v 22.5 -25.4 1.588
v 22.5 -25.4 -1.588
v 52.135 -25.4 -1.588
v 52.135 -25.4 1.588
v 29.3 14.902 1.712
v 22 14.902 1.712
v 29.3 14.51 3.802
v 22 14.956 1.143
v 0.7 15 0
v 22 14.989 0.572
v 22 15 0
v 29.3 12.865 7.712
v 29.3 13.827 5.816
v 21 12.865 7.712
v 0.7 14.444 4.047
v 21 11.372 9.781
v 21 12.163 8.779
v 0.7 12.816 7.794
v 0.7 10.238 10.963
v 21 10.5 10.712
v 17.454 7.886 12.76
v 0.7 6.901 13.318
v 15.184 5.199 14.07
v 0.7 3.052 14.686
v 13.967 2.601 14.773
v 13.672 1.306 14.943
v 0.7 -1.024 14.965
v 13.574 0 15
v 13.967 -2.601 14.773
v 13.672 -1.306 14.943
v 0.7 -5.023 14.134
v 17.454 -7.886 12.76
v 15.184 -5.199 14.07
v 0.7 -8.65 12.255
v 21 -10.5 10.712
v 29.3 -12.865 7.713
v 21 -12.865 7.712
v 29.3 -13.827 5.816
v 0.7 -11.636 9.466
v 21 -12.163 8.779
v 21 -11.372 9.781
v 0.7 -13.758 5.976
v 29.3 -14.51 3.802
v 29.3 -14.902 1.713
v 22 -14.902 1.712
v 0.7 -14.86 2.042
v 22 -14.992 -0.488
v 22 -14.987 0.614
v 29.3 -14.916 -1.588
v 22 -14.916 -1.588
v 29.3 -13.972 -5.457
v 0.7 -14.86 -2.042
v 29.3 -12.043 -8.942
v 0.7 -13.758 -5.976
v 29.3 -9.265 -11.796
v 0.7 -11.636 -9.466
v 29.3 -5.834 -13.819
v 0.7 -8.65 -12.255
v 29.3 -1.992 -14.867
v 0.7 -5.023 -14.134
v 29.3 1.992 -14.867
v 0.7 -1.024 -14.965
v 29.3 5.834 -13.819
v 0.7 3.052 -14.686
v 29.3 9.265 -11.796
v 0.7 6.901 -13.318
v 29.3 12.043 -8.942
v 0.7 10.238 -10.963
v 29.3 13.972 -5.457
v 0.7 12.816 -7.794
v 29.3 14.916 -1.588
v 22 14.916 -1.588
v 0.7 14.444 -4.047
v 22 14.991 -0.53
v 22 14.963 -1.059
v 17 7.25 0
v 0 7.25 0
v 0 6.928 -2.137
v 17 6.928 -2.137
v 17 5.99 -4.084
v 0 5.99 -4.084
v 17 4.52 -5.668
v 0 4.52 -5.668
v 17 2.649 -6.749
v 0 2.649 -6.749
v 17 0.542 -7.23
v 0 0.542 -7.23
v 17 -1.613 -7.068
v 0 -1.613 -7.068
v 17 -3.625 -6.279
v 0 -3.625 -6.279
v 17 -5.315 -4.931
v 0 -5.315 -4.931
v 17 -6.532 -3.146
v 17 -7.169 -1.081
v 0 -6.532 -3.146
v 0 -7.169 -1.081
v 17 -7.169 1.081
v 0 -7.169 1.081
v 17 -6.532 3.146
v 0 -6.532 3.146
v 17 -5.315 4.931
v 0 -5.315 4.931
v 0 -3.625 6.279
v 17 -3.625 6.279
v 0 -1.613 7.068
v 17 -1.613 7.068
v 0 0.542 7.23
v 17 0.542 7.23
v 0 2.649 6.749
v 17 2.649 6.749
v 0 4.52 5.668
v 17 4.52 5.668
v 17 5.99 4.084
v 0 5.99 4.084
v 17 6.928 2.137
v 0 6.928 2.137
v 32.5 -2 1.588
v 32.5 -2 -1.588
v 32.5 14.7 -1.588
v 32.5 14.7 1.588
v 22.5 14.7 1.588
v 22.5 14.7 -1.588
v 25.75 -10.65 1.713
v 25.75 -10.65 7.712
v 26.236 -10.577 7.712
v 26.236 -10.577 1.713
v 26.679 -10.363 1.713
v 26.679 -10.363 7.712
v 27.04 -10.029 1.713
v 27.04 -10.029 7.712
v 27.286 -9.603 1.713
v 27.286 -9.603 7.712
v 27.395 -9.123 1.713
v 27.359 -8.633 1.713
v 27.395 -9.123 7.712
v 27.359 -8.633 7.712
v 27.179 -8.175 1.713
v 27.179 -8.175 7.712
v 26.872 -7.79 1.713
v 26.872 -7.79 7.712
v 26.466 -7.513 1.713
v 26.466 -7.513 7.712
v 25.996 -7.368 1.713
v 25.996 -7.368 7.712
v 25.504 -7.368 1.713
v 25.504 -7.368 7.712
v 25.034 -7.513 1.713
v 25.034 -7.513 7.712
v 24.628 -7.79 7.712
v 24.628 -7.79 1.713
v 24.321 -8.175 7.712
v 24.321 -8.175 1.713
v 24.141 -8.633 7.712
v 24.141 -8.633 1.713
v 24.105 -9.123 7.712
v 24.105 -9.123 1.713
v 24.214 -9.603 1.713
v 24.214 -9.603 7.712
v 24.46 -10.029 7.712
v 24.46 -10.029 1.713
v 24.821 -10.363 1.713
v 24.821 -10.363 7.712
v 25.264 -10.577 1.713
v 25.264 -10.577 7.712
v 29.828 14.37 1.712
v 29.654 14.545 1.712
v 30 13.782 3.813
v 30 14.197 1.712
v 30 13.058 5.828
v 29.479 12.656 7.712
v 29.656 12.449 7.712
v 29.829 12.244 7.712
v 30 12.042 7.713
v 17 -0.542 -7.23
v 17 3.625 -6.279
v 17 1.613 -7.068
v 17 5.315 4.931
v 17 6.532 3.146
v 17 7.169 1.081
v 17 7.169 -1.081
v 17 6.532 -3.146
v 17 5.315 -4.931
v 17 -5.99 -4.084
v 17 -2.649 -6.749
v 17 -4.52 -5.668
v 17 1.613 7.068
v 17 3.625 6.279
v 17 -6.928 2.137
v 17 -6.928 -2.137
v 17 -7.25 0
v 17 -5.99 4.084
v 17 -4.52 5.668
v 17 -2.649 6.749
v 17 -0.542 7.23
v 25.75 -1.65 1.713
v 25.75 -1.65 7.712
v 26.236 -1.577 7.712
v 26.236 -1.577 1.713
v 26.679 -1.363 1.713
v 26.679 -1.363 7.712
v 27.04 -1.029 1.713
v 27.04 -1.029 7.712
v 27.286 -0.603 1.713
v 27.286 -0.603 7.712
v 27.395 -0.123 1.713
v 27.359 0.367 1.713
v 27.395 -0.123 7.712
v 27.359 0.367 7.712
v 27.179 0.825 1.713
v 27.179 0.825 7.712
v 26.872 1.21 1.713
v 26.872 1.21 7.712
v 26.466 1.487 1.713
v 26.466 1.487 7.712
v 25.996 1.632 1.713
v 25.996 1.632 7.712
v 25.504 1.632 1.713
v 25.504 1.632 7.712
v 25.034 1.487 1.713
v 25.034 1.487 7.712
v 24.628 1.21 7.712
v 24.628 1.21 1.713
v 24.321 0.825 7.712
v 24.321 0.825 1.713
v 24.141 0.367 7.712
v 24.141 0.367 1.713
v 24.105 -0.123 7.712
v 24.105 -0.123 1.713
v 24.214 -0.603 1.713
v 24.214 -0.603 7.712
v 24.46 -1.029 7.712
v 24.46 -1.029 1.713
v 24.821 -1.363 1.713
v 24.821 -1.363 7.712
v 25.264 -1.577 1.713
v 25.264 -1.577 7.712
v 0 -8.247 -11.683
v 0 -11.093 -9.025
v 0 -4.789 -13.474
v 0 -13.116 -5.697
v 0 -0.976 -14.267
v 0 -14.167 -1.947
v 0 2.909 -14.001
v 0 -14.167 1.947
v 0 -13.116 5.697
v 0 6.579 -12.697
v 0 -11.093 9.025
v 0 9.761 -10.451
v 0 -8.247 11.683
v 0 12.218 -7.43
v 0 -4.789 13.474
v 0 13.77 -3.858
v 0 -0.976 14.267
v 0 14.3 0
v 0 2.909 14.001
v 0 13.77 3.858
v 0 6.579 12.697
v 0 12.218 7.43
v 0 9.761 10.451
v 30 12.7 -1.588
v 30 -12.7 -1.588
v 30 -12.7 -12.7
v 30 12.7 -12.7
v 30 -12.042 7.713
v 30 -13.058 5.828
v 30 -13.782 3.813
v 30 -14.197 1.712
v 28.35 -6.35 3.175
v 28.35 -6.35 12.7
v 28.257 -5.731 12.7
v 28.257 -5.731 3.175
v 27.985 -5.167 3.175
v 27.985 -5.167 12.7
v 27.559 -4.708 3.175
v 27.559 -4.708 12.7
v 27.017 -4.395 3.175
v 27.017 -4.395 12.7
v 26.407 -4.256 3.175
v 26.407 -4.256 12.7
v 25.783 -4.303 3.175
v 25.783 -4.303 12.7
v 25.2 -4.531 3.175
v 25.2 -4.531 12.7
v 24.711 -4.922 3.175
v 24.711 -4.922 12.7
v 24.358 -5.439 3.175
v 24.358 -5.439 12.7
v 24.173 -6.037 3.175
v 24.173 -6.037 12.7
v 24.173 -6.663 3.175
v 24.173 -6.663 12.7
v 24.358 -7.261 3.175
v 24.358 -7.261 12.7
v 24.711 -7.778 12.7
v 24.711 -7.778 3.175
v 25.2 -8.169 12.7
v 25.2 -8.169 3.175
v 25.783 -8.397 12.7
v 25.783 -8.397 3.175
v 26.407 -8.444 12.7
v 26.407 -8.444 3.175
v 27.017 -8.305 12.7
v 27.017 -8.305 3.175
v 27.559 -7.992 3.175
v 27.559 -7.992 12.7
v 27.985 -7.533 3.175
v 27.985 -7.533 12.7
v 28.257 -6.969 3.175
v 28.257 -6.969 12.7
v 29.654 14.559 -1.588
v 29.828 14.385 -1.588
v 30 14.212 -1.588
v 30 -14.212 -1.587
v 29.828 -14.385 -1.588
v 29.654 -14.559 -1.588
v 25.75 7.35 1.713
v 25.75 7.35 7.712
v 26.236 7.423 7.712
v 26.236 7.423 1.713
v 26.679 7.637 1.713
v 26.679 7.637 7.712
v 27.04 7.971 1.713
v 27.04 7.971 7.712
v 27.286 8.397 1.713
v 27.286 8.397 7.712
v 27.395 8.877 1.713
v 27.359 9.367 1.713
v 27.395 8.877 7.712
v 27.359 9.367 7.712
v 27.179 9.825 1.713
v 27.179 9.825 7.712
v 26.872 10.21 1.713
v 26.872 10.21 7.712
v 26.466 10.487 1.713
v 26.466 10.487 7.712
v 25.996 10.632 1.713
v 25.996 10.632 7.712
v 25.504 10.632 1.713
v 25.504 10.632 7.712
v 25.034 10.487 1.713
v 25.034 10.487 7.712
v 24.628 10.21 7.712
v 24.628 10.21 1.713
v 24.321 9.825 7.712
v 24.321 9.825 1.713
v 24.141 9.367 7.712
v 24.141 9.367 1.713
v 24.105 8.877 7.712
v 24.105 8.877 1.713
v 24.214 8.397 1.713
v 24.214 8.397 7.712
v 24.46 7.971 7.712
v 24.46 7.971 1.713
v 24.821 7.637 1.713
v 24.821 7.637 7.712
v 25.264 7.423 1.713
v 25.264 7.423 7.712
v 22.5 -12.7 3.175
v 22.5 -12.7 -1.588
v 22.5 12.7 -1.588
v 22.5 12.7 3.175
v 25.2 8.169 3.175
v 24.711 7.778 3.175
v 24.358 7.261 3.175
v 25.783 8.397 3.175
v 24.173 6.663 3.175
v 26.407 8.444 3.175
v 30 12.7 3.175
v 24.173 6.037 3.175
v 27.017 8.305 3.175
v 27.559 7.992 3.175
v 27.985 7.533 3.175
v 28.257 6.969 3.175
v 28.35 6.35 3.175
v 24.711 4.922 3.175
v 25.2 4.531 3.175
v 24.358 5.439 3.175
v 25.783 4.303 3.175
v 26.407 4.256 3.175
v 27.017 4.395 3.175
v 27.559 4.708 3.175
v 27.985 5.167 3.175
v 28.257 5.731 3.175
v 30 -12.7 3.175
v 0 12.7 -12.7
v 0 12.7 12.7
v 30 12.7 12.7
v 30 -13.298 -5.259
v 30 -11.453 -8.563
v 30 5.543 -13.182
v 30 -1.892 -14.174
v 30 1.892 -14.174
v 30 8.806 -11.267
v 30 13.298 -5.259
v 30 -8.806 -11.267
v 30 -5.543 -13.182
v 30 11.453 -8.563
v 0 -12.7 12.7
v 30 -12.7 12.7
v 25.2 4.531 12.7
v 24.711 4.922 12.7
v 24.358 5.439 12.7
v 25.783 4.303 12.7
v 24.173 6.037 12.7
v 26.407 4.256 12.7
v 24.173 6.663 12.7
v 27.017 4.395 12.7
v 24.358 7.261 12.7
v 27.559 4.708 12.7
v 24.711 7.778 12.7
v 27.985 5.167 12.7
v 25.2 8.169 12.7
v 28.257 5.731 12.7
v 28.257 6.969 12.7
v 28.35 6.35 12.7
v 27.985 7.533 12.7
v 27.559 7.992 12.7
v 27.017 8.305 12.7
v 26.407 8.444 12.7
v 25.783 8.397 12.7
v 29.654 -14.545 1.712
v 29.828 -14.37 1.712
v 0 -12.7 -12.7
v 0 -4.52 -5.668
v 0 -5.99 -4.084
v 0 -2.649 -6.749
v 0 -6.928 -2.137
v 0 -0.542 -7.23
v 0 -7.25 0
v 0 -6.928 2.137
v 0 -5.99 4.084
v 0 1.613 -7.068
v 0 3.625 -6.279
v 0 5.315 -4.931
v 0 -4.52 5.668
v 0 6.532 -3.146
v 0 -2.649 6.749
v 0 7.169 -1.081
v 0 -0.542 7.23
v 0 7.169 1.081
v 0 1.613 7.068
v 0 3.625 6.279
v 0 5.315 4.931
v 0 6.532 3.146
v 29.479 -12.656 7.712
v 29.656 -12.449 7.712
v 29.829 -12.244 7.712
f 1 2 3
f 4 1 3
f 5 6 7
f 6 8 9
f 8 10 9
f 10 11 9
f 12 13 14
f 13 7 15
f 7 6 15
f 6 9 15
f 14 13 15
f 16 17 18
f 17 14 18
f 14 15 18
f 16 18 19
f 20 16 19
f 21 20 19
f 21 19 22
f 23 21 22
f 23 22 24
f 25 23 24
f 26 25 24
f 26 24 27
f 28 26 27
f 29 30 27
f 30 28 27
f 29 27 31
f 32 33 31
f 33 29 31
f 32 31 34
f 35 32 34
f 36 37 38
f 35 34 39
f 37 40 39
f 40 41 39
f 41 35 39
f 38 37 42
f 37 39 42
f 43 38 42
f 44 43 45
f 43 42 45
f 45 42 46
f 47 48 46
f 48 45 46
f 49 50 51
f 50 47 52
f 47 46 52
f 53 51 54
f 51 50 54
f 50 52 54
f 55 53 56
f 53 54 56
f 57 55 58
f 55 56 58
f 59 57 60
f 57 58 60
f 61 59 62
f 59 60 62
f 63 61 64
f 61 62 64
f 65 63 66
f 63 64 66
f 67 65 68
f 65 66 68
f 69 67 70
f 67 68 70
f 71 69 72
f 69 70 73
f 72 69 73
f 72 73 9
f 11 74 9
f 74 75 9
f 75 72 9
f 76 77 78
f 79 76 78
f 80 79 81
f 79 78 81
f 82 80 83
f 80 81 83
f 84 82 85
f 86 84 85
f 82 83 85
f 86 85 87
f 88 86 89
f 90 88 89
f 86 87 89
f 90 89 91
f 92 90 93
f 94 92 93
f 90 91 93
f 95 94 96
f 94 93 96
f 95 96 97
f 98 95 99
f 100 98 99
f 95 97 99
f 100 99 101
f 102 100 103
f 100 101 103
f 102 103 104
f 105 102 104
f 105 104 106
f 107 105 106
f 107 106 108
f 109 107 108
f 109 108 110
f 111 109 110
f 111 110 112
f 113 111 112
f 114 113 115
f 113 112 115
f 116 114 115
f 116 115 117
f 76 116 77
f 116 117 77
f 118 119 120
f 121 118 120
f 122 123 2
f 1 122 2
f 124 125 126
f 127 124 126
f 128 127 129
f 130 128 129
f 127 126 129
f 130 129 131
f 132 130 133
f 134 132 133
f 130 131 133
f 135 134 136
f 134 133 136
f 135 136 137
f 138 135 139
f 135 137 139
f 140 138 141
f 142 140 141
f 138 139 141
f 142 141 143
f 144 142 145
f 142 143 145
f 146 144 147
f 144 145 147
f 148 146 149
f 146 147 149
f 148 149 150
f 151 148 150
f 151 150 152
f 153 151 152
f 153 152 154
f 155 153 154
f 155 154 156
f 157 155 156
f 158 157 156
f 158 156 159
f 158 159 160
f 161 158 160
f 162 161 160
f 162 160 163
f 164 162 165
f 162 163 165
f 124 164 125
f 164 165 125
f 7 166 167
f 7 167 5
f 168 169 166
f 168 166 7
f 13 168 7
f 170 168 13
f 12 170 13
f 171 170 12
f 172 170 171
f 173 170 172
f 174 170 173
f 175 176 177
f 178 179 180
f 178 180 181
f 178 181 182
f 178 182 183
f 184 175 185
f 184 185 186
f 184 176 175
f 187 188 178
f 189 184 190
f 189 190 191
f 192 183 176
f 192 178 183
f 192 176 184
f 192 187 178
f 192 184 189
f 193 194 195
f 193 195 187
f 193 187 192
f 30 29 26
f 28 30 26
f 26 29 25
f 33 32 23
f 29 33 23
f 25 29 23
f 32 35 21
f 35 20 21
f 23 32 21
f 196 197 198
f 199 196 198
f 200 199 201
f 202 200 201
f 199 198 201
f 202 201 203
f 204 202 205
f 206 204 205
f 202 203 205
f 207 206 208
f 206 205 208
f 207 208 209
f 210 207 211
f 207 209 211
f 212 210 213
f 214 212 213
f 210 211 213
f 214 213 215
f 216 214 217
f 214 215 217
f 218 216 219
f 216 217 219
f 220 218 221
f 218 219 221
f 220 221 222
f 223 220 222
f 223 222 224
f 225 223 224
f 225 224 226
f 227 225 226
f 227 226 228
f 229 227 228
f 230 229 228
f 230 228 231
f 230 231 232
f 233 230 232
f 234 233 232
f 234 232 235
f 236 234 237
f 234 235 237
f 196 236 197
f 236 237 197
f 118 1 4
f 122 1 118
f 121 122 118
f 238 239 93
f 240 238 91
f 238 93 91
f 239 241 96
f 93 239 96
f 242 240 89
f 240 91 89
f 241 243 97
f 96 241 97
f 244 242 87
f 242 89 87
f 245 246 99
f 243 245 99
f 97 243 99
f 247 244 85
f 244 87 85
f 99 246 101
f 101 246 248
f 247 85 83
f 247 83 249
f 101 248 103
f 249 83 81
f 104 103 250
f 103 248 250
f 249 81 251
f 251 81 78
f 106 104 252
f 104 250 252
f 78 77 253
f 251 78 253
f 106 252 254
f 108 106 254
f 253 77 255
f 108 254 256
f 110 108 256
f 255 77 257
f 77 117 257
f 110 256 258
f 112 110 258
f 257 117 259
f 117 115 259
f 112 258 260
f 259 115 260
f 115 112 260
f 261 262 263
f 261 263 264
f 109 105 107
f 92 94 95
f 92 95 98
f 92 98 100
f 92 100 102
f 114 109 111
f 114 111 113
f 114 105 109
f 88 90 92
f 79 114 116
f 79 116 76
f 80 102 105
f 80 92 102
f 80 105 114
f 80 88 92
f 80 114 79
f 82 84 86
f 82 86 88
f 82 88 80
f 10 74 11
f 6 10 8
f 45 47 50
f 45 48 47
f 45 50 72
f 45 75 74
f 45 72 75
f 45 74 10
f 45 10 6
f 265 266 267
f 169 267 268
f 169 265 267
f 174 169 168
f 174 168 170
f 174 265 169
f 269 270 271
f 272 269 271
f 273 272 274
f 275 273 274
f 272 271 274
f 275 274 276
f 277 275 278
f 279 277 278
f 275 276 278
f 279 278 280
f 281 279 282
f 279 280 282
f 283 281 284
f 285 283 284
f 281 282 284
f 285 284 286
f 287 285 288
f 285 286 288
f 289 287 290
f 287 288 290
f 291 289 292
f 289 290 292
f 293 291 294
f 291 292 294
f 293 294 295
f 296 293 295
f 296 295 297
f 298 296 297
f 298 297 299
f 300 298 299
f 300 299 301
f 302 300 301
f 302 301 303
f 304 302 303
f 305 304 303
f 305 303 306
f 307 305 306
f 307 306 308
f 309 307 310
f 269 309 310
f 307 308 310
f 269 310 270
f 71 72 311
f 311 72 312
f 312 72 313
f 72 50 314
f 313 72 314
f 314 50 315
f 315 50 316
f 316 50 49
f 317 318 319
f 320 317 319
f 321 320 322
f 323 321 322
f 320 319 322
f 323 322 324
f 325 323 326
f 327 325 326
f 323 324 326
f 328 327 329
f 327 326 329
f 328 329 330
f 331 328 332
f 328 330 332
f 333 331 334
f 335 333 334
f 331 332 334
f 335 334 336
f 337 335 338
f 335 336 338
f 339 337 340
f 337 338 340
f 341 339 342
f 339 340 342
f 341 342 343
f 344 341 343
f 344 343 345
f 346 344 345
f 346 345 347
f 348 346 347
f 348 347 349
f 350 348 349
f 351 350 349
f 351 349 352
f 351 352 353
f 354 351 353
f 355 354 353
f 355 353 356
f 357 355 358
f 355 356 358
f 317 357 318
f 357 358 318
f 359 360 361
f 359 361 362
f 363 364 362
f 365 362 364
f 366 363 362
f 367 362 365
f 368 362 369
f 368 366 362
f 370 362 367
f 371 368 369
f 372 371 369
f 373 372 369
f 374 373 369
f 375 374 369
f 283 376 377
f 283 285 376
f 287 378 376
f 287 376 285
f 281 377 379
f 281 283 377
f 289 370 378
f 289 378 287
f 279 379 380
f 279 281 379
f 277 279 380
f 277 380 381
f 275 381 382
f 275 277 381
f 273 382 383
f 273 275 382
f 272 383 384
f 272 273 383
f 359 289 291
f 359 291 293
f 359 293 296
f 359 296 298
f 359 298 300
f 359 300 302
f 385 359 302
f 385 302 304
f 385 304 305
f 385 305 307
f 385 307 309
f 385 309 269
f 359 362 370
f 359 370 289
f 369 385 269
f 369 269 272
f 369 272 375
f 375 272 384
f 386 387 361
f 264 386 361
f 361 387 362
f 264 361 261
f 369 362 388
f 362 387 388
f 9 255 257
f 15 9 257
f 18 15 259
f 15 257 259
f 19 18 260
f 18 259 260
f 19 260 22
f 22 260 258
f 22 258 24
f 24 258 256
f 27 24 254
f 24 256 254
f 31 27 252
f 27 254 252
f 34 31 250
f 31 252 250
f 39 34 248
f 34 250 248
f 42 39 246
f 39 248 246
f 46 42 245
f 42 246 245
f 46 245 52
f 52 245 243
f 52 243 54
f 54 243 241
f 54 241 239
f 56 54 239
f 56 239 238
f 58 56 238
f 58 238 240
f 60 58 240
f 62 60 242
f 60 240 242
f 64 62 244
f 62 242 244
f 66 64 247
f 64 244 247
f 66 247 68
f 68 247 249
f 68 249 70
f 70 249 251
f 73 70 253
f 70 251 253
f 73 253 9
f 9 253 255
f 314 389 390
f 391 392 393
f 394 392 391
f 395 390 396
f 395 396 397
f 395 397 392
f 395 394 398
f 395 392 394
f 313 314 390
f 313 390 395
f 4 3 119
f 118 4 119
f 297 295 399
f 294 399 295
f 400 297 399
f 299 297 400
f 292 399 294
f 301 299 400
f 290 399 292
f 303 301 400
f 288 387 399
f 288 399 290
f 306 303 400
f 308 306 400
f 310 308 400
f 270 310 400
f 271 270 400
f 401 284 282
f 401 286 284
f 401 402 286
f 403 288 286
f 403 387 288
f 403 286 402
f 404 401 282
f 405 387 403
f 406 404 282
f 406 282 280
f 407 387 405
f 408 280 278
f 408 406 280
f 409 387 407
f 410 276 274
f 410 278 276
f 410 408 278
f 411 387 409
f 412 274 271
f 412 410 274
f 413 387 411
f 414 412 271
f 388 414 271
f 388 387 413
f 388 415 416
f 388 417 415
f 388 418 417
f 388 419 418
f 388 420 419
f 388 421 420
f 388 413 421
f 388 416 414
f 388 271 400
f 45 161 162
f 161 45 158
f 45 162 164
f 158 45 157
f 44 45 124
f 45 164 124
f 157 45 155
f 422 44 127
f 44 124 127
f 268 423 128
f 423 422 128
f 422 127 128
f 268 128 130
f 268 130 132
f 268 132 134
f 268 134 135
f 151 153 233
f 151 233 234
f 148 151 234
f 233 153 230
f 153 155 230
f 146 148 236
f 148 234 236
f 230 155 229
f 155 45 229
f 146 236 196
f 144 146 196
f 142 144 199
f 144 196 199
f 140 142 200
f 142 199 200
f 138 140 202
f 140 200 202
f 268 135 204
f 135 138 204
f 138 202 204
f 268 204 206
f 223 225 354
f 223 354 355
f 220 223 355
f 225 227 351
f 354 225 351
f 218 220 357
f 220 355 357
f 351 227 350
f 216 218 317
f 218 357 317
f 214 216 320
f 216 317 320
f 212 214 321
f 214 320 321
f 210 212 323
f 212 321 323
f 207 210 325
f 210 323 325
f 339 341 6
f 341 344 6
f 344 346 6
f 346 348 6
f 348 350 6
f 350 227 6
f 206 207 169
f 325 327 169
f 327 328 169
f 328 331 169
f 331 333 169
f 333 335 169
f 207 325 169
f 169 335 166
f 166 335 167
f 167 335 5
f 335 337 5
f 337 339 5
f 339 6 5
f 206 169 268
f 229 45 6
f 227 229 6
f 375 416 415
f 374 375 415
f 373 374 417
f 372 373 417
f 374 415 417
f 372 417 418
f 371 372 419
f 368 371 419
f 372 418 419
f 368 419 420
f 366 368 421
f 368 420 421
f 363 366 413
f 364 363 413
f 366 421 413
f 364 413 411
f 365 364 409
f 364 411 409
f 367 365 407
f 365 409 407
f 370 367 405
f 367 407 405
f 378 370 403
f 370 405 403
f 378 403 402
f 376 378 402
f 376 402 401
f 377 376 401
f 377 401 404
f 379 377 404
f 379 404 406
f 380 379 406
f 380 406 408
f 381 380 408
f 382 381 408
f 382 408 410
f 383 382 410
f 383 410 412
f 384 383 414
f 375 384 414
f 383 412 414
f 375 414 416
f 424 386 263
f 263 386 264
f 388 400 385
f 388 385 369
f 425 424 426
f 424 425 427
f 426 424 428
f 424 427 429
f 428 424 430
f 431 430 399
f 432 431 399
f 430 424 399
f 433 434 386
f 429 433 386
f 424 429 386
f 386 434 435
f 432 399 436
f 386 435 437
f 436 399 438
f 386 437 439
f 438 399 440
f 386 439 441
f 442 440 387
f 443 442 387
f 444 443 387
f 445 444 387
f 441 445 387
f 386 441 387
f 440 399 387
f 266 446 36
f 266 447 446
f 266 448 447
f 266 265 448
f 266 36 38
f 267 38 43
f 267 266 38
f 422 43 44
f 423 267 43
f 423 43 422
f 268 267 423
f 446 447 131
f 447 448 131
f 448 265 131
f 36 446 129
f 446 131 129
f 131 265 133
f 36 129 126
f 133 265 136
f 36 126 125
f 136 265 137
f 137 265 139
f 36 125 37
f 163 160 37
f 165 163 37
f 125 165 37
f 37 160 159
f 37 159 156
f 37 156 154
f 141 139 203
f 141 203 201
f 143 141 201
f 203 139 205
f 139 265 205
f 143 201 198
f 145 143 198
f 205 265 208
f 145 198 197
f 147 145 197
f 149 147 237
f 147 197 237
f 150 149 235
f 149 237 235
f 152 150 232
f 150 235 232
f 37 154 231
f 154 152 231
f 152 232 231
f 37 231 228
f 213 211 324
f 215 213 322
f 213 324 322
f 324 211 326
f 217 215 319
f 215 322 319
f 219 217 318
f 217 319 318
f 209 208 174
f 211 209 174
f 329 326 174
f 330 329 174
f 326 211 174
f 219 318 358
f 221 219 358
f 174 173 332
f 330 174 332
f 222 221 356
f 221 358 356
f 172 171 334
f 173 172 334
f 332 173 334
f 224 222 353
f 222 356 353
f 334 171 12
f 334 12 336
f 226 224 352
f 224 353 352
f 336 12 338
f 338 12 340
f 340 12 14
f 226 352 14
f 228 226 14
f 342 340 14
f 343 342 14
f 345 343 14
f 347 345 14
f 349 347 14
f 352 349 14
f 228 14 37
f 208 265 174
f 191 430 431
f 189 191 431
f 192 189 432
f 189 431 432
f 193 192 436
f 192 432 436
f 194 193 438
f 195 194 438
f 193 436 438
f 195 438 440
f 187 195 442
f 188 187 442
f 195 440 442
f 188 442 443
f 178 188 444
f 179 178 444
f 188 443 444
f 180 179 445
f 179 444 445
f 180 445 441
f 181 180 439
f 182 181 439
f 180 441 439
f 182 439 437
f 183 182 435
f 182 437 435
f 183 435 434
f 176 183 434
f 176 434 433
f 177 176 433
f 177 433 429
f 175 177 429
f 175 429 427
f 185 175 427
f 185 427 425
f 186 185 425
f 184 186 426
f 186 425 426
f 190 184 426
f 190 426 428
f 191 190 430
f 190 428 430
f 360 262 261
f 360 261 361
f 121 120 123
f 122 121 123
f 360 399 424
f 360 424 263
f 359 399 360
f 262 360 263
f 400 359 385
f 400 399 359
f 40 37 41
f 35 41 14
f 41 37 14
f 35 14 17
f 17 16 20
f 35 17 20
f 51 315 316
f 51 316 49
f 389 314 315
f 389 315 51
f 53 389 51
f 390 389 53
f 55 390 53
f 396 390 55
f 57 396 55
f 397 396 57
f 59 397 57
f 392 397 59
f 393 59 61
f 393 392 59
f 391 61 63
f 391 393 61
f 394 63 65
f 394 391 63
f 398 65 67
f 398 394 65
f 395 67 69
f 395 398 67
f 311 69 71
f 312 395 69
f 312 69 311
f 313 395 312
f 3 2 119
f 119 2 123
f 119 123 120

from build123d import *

# Parameters (mm, degrees)
SKETCH001_R       = 15
PAD_DEPTH         = 30
CHAMFER_SIZE      = 0.7
POCKET_DEPTH      = 15.001
POCKET_DEPTH_BACK = -15.001
SKETCH003_R       = 1.65
POCKET001_DEPTH   = 6
SKETCH004_R       = 7.25
POCKET002_DEPTH   = 17
PAD001_DEPTH      = 3.175
SKETCH006_W       = 30
SKETCH006_H       = 25.4
PAD002_DEPTH      = 12.7
SKETCH007_R       = 7.25
POCKET003_DEPTH   = 17
POCKET004_DEPTH   = 25.401
SKETCH010_R       = 2.1
POCKET005_DEPTH   = 9.525


with BuildPart() as body:
    # Sketch001 → Pad (new body)
    with BuildSketch(Plane.YZ):
        Circle(SKETCH001_R)
    extrude(amount=PAD_DEPTH)

    # Chamfer
    chamfer_edges = [body.edges().sort_by_distance(p)[0] for p in [
        (30, -15, 0),
        (0, -15, 0),
    ]]
    chamfer(chamfer_edges, length=CHAMFER_SIZE)

    # Sketch002 (on DatumPlane) → Pocket (cut, two sides)
    with BuildSketch(Plane(origin=(15, 0, 0), x_dir=(1, 0, 0), z_dir=(0, -1, 0))) as pocket_sk:
        Polygon((15, -1.5875), (7, -1.5875), (7, 1.7125), (15, 1.7125), (15, 7.7125), (6, 7.7125), (6, 10.7125), (-4.998523, 17.0625), (-4.998523, 38.7125), (16, 38.7125), (16, -1.5875), align=None)
    extrude(amount=-POCKET_DEPTH, mode=Mode.SUBTRACT)
    extrude(pocket_sk.sketch, amount=-POCKET_DEPTH_BACK, mode=Mode.SUBTRACT)

    # Sketch003 (on Face8 of Pocket) → Pocket001 (cut)
    with BuildSketch(Plane(origin=(0, 0, 7.7125), x_dir=(0, -1, 0), z_dir=(0, 0, 1))):
        with Locations((9, 25.75)):
            Circle(SKETCH003_R)
        with Locations((0, 25.75)):
            Circle(SKETCH003_R)
        with Locations((-9, 25.75)):
            Circle(SKETCH003_R)
    extrude(amount=-POCKET001_DEPTH, mode=Mode.SUBTRACT)

    # Sketch004 (on Face17 of Pocket001) → Pocket002 (cut)
    with BuildSketch(Plane(origin=(0, 0, 0), x_dir=(0, 1, 0), z_dir=(-1, 0, 0))):
        Circle(SKETCH004_R)
    extrude(amount=-POCKET002_DEPTH, mode=Mode.SUBTRACT)


with BuildPart() as body001:
    # Sketch005 (on ShapeBinder) → Pad001 (new body)
    with BuildSketch(Plane.XY.offset(-1.5875)):
        Polygon((22.5, 14.7), (22.5, -25.4), (52.134931, -25.4), (32.5, -2), (32.5, 14.7), align=None)
    extrude(amount=PAD001_DEPTH)


with BuildPart() as body002:
    # Sketch006 → Pad002 (new body, symmetric)
    with BuildSketch(Plane.XY):
        with Locations((15, 0)):
            Rectangle(SKETCH006_W, SKETCH006_H)
    extrude(amount=PAD002_DEPTH, both=True)

    # Sketch007 (on Face4 of Pad002) → Pocket003 (cut)
    with BuildSketch(Plane(origin=(0, 0, 0), x_dir=(0, -1, 0), z_dir=(-1, 0, 0))):
        Circle(SKETCH007_R)
    extrude(amount=-POCKET003_DEPTH, mode=Mode.SUBTRACT)

    # Sketch008 (on Face6 of Pocket003) → Pocket004 (cut, through all)
    with BuildSketch(Plane.XZ.offset(12.7)):
        Polygon((41, -1.5875), (22.5, -1.5875), (22.5, 3.175), (36, 3.175), (36, 18.175), (21, 18.175), (21, 33.175), (41, 33.175), align=None)
    extrude(amount=-POCKET004_DEPTH, mode=Mode.SUBTRACT)

    # Sketch010 (on Face8 of Pocket004) → Pocket005 (cut)
    with BuildSketch(Plane.XY.offset(12.7)):
        with Locations((26.25, -6.35)):
            Circle(SKETCH010_R)
        with Locations((26.25, 6.35)):
            Circle(SKETCH010_R)
    extrude(amount=-POCKET005_DEPTH, mode=Mode.SUBTRACT)


solid = Compound([body.part, body001.part, body002.part])
